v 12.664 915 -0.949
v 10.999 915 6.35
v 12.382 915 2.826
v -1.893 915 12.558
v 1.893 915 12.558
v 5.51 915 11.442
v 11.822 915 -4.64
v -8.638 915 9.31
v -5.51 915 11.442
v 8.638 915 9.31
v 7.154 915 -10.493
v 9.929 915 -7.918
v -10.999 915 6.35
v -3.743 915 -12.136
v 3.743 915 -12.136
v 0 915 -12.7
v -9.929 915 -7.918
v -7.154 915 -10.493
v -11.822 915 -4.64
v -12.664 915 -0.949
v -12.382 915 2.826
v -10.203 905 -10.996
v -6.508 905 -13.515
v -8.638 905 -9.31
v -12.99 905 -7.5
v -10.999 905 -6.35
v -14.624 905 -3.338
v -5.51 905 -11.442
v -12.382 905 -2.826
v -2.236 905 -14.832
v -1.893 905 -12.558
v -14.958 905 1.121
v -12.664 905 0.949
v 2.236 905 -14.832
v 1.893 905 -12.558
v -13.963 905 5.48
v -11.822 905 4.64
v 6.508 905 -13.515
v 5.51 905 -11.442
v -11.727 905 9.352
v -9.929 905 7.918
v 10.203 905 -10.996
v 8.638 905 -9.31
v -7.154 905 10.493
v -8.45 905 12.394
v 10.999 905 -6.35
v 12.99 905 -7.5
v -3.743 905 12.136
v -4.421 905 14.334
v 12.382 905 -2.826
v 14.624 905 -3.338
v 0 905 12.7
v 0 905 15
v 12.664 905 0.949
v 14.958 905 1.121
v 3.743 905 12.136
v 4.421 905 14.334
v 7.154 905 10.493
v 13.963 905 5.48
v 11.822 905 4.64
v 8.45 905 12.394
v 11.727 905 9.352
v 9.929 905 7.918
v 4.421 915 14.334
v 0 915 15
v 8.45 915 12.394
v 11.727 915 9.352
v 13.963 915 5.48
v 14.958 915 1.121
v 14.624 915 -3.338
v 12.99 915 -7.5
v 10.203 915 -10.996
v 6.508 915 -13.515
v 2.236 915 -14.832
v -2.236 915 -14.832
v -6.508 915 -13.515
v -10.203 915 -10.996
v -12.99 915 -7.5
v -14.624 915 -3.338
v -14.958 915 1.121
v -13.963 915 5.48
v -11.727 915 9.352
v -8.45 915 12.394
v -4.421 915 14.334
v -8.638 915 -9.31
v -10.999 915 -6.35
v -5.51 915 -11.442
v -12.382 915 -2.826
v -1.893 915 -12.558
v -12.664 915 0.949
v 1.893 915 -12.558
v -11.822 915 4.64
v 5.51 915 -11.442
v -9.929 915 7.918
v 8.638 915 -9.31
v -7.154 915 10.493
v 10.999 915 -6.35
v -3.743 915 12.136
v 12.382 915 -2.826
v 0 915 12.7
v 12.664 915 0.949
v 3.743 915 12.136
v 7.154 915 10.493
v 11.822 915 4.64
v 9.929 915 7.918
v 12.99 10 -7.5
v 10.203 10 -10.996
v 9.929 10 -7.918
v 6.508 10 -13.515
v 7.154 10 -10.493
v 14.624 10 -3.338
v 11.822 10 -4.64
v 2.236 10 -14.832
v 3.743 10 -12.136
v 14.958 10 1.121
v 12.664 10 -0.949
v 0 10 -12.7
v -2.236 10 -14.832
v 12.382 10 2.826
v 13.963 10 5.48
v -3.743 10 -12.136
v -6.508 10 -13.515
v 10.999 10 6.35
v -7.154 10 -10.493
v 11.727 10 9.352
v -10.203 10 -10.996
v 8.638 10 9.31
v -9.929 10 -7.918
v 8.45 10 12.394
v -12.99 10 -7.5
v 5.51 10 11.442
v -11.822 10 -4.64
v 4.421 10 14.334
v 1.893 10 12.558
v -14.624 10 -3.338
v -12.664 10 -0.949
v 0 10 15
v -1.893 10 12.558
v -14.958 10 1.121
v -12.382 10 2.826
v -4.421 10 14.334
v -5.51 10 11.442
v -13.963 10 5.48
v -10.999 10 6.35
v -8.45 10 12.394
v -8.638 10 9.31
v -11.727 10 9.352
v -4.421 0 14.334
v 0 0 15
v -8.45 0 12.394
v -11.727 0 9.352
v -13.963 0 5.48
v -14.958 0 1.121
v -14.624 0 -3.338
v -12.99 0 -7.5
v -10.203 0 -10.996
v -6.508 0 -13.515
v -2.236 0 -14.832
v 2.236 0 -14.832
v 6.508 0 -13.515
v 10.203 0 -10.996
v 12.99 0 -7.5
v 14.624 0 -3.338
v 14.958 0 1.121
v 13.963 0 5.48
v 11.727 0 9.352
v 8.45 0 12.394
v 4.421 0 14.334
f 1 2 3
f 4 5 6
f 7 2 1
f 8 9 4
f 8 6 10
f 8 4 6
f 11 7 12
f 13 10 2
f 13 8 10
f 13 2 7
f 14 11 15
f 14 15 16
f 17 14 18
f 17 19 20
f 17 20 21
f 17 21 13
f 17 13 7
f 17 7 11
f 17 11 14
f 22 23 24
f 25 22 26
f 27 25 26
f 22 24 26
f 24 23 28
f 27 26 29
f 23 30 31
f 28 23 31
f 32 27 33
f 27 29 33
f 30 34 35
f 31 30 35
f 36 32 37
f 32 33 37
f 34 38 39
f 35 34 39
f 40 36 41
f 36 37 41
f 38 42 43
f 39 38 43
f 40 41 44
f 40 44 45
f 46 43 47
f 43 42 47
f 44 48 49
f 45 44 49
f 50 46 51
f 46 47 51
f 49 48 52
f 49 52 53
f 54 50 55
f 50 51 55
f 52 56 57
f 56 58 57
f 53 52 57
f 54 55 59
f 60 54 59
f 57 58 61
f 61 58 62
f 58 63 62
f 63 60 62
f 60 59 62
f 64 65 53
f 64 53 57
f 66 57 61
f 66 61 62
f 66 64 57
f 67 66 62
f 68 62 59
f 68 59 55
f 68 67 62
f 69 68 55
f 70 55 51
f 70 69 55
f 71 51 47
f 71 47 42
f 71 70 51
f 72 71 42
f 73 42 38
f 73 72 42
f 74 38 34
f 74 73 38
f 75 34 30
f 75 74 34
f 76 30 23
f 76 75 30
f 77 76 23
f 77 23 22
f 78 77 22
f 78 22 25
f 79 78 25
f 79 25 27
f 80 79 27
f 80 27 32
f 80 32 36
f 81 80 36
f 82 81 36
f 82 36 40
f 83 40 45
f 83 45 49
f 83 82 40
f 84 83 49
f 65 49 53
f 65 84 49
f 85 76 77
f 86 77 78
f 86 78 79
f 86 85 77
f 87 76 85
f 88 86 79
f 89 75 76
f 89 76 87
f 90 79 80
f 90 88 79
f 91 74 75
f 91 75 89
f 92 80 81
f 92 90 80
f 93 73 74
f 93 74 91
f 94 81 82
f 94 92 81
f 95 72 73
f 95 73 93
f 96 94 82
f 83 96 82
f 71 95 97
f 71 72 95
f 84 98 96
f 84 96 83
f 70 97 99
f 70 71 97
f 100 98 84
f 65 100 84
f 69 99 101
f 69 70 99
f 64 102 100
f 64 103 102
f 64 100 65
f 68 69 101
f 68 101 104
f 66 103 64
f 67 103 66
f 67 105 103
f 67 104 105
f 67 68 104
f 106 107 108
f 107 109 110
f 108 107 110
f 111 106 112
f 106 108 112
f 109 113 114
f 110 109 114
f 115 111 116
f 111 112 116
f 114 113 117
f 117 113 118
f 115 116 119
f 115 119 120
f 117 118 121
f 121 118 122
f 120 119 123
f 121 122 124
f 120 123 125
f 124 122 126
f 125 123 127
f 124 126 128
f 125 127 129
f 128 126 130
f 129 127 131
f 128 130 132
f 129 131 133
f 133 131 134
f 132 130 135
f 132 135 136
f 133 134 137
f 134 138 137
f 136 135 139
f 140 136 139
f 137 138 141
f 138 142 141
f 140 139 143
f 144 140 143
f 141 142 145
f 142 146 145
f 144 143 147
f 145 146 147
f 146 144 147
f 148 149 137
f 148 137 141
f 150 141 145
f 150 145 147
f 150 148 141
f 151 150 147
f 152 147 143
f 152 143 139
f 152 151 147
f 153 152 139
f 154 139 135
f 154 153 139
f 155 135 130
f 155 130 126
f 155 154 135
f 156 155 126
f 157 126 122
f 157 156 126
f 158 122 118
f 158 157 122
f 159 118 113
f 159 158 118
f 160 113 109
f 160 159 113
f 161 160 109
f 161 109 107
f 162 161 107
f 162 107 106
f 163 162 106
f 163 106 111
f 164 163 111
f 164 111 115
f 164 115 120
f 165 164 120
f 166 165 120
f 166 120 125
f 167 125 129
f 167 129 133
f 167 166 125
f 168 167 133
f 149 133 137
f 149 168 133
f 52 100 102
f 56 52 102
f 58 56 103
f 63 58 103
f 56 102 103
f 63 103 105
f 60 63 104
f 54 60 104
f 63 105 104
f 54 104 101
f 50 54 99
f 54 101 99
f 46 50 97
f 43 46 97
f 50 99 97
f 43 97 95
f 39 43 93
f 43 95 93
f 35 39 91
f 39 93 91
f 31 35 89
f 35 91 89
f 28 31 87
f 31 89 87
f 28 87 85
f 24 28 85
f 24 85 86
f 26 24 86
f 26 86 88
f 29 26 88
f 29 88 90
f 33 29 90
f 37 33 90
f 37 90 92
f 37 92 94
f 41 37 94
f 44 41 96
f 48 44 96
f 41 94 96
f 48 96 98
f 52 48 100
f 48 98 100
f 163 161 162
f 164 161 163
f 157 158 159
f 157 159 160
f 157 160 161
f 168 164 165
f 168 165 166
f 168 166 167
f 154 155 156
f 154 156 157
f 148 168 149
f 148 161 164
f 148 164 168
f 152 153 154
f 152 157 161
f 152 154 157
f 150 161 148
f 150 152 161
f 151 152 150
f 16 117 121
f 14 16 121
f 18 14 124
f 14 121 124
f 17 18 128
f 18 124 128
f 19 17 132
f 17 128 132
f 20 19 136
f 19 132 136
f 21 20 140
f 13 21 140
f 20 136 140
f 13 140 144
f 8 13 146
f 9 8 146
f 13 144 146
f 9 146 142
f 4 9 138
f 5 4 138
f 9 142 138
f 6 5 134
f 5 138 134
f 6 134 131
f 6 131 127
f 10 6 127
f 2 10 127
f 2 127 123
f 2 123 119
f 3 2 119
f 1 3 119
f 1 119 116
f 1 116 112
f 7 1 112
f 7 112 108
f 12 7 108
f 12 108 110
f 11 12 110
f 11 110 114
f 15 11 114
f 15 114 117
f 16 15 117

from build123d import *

# Parameters (mm, degrees)
CROQUIS1_R              = 12.7
SALIENTE_EXTRUIR1_DEPTH = 915
CROQUIS2_R              = 15
CROQUIS2_R_2            = 12.7
SALIENTE_EXTRUIR2_DEPTH = 10
CROQUIS3_R              = 15
CROQUIS3_R_2            = 12.7
SALIENTE_EXTRUIR3_DEPTH = 10


with BuildPart() as part:
    # Croquis1 → Saliente-Extruir1 (new body)
    with BuildSketch(Plane(origin=(0, 0, 0), x_dir=(1, 0, 0), z_dir=(0, 1, 0))):
        with Locations(Location((0, 0, 0), (0, 0, 90))):
            Circle(CROQUIS1_R)
    extrude(amount=SALIENTE_EXTRUIR1_DEPTH)

    # Croquis3 → Saliente-Extruir3 (add)
    with BuildSketch(Plane.XZ):
        with Locations(Location((0, 0, 0), (0, 0, 90))):
            Circle(CROQUIS3_R)
        with Locations(Location((0, 0, 0), (0, 0, 90))):
            Circle(CROQUIS3_R_2, mode=Mode.SUBTRACT)
    extrude(amount=-SALIENTE_EXTRUIR3_DEPTH)


with BuildPart() as body_2:
    # Croquis2 → Saliente-Extruir2 (new body)
    with BuildSketch(Plane(origin=(0, 915, 0), x_dir=(1, 0, 0), z_dir=(0, 1, 0))):
        with Locations(Location((0, 0, 0), (0, 0, 270))):
            Circle(CROQUIS2_R)
        with Locations(Location((0, 0, 0), (0, 0, 270))):
            Circle(CROQUIS2_R_2, mode=Mode.SUBTRACT)
    extrude(amount=-SALIENTE_EXTRUIR2_DEPTH)


solid = Compound([part.part, body_2.part])
